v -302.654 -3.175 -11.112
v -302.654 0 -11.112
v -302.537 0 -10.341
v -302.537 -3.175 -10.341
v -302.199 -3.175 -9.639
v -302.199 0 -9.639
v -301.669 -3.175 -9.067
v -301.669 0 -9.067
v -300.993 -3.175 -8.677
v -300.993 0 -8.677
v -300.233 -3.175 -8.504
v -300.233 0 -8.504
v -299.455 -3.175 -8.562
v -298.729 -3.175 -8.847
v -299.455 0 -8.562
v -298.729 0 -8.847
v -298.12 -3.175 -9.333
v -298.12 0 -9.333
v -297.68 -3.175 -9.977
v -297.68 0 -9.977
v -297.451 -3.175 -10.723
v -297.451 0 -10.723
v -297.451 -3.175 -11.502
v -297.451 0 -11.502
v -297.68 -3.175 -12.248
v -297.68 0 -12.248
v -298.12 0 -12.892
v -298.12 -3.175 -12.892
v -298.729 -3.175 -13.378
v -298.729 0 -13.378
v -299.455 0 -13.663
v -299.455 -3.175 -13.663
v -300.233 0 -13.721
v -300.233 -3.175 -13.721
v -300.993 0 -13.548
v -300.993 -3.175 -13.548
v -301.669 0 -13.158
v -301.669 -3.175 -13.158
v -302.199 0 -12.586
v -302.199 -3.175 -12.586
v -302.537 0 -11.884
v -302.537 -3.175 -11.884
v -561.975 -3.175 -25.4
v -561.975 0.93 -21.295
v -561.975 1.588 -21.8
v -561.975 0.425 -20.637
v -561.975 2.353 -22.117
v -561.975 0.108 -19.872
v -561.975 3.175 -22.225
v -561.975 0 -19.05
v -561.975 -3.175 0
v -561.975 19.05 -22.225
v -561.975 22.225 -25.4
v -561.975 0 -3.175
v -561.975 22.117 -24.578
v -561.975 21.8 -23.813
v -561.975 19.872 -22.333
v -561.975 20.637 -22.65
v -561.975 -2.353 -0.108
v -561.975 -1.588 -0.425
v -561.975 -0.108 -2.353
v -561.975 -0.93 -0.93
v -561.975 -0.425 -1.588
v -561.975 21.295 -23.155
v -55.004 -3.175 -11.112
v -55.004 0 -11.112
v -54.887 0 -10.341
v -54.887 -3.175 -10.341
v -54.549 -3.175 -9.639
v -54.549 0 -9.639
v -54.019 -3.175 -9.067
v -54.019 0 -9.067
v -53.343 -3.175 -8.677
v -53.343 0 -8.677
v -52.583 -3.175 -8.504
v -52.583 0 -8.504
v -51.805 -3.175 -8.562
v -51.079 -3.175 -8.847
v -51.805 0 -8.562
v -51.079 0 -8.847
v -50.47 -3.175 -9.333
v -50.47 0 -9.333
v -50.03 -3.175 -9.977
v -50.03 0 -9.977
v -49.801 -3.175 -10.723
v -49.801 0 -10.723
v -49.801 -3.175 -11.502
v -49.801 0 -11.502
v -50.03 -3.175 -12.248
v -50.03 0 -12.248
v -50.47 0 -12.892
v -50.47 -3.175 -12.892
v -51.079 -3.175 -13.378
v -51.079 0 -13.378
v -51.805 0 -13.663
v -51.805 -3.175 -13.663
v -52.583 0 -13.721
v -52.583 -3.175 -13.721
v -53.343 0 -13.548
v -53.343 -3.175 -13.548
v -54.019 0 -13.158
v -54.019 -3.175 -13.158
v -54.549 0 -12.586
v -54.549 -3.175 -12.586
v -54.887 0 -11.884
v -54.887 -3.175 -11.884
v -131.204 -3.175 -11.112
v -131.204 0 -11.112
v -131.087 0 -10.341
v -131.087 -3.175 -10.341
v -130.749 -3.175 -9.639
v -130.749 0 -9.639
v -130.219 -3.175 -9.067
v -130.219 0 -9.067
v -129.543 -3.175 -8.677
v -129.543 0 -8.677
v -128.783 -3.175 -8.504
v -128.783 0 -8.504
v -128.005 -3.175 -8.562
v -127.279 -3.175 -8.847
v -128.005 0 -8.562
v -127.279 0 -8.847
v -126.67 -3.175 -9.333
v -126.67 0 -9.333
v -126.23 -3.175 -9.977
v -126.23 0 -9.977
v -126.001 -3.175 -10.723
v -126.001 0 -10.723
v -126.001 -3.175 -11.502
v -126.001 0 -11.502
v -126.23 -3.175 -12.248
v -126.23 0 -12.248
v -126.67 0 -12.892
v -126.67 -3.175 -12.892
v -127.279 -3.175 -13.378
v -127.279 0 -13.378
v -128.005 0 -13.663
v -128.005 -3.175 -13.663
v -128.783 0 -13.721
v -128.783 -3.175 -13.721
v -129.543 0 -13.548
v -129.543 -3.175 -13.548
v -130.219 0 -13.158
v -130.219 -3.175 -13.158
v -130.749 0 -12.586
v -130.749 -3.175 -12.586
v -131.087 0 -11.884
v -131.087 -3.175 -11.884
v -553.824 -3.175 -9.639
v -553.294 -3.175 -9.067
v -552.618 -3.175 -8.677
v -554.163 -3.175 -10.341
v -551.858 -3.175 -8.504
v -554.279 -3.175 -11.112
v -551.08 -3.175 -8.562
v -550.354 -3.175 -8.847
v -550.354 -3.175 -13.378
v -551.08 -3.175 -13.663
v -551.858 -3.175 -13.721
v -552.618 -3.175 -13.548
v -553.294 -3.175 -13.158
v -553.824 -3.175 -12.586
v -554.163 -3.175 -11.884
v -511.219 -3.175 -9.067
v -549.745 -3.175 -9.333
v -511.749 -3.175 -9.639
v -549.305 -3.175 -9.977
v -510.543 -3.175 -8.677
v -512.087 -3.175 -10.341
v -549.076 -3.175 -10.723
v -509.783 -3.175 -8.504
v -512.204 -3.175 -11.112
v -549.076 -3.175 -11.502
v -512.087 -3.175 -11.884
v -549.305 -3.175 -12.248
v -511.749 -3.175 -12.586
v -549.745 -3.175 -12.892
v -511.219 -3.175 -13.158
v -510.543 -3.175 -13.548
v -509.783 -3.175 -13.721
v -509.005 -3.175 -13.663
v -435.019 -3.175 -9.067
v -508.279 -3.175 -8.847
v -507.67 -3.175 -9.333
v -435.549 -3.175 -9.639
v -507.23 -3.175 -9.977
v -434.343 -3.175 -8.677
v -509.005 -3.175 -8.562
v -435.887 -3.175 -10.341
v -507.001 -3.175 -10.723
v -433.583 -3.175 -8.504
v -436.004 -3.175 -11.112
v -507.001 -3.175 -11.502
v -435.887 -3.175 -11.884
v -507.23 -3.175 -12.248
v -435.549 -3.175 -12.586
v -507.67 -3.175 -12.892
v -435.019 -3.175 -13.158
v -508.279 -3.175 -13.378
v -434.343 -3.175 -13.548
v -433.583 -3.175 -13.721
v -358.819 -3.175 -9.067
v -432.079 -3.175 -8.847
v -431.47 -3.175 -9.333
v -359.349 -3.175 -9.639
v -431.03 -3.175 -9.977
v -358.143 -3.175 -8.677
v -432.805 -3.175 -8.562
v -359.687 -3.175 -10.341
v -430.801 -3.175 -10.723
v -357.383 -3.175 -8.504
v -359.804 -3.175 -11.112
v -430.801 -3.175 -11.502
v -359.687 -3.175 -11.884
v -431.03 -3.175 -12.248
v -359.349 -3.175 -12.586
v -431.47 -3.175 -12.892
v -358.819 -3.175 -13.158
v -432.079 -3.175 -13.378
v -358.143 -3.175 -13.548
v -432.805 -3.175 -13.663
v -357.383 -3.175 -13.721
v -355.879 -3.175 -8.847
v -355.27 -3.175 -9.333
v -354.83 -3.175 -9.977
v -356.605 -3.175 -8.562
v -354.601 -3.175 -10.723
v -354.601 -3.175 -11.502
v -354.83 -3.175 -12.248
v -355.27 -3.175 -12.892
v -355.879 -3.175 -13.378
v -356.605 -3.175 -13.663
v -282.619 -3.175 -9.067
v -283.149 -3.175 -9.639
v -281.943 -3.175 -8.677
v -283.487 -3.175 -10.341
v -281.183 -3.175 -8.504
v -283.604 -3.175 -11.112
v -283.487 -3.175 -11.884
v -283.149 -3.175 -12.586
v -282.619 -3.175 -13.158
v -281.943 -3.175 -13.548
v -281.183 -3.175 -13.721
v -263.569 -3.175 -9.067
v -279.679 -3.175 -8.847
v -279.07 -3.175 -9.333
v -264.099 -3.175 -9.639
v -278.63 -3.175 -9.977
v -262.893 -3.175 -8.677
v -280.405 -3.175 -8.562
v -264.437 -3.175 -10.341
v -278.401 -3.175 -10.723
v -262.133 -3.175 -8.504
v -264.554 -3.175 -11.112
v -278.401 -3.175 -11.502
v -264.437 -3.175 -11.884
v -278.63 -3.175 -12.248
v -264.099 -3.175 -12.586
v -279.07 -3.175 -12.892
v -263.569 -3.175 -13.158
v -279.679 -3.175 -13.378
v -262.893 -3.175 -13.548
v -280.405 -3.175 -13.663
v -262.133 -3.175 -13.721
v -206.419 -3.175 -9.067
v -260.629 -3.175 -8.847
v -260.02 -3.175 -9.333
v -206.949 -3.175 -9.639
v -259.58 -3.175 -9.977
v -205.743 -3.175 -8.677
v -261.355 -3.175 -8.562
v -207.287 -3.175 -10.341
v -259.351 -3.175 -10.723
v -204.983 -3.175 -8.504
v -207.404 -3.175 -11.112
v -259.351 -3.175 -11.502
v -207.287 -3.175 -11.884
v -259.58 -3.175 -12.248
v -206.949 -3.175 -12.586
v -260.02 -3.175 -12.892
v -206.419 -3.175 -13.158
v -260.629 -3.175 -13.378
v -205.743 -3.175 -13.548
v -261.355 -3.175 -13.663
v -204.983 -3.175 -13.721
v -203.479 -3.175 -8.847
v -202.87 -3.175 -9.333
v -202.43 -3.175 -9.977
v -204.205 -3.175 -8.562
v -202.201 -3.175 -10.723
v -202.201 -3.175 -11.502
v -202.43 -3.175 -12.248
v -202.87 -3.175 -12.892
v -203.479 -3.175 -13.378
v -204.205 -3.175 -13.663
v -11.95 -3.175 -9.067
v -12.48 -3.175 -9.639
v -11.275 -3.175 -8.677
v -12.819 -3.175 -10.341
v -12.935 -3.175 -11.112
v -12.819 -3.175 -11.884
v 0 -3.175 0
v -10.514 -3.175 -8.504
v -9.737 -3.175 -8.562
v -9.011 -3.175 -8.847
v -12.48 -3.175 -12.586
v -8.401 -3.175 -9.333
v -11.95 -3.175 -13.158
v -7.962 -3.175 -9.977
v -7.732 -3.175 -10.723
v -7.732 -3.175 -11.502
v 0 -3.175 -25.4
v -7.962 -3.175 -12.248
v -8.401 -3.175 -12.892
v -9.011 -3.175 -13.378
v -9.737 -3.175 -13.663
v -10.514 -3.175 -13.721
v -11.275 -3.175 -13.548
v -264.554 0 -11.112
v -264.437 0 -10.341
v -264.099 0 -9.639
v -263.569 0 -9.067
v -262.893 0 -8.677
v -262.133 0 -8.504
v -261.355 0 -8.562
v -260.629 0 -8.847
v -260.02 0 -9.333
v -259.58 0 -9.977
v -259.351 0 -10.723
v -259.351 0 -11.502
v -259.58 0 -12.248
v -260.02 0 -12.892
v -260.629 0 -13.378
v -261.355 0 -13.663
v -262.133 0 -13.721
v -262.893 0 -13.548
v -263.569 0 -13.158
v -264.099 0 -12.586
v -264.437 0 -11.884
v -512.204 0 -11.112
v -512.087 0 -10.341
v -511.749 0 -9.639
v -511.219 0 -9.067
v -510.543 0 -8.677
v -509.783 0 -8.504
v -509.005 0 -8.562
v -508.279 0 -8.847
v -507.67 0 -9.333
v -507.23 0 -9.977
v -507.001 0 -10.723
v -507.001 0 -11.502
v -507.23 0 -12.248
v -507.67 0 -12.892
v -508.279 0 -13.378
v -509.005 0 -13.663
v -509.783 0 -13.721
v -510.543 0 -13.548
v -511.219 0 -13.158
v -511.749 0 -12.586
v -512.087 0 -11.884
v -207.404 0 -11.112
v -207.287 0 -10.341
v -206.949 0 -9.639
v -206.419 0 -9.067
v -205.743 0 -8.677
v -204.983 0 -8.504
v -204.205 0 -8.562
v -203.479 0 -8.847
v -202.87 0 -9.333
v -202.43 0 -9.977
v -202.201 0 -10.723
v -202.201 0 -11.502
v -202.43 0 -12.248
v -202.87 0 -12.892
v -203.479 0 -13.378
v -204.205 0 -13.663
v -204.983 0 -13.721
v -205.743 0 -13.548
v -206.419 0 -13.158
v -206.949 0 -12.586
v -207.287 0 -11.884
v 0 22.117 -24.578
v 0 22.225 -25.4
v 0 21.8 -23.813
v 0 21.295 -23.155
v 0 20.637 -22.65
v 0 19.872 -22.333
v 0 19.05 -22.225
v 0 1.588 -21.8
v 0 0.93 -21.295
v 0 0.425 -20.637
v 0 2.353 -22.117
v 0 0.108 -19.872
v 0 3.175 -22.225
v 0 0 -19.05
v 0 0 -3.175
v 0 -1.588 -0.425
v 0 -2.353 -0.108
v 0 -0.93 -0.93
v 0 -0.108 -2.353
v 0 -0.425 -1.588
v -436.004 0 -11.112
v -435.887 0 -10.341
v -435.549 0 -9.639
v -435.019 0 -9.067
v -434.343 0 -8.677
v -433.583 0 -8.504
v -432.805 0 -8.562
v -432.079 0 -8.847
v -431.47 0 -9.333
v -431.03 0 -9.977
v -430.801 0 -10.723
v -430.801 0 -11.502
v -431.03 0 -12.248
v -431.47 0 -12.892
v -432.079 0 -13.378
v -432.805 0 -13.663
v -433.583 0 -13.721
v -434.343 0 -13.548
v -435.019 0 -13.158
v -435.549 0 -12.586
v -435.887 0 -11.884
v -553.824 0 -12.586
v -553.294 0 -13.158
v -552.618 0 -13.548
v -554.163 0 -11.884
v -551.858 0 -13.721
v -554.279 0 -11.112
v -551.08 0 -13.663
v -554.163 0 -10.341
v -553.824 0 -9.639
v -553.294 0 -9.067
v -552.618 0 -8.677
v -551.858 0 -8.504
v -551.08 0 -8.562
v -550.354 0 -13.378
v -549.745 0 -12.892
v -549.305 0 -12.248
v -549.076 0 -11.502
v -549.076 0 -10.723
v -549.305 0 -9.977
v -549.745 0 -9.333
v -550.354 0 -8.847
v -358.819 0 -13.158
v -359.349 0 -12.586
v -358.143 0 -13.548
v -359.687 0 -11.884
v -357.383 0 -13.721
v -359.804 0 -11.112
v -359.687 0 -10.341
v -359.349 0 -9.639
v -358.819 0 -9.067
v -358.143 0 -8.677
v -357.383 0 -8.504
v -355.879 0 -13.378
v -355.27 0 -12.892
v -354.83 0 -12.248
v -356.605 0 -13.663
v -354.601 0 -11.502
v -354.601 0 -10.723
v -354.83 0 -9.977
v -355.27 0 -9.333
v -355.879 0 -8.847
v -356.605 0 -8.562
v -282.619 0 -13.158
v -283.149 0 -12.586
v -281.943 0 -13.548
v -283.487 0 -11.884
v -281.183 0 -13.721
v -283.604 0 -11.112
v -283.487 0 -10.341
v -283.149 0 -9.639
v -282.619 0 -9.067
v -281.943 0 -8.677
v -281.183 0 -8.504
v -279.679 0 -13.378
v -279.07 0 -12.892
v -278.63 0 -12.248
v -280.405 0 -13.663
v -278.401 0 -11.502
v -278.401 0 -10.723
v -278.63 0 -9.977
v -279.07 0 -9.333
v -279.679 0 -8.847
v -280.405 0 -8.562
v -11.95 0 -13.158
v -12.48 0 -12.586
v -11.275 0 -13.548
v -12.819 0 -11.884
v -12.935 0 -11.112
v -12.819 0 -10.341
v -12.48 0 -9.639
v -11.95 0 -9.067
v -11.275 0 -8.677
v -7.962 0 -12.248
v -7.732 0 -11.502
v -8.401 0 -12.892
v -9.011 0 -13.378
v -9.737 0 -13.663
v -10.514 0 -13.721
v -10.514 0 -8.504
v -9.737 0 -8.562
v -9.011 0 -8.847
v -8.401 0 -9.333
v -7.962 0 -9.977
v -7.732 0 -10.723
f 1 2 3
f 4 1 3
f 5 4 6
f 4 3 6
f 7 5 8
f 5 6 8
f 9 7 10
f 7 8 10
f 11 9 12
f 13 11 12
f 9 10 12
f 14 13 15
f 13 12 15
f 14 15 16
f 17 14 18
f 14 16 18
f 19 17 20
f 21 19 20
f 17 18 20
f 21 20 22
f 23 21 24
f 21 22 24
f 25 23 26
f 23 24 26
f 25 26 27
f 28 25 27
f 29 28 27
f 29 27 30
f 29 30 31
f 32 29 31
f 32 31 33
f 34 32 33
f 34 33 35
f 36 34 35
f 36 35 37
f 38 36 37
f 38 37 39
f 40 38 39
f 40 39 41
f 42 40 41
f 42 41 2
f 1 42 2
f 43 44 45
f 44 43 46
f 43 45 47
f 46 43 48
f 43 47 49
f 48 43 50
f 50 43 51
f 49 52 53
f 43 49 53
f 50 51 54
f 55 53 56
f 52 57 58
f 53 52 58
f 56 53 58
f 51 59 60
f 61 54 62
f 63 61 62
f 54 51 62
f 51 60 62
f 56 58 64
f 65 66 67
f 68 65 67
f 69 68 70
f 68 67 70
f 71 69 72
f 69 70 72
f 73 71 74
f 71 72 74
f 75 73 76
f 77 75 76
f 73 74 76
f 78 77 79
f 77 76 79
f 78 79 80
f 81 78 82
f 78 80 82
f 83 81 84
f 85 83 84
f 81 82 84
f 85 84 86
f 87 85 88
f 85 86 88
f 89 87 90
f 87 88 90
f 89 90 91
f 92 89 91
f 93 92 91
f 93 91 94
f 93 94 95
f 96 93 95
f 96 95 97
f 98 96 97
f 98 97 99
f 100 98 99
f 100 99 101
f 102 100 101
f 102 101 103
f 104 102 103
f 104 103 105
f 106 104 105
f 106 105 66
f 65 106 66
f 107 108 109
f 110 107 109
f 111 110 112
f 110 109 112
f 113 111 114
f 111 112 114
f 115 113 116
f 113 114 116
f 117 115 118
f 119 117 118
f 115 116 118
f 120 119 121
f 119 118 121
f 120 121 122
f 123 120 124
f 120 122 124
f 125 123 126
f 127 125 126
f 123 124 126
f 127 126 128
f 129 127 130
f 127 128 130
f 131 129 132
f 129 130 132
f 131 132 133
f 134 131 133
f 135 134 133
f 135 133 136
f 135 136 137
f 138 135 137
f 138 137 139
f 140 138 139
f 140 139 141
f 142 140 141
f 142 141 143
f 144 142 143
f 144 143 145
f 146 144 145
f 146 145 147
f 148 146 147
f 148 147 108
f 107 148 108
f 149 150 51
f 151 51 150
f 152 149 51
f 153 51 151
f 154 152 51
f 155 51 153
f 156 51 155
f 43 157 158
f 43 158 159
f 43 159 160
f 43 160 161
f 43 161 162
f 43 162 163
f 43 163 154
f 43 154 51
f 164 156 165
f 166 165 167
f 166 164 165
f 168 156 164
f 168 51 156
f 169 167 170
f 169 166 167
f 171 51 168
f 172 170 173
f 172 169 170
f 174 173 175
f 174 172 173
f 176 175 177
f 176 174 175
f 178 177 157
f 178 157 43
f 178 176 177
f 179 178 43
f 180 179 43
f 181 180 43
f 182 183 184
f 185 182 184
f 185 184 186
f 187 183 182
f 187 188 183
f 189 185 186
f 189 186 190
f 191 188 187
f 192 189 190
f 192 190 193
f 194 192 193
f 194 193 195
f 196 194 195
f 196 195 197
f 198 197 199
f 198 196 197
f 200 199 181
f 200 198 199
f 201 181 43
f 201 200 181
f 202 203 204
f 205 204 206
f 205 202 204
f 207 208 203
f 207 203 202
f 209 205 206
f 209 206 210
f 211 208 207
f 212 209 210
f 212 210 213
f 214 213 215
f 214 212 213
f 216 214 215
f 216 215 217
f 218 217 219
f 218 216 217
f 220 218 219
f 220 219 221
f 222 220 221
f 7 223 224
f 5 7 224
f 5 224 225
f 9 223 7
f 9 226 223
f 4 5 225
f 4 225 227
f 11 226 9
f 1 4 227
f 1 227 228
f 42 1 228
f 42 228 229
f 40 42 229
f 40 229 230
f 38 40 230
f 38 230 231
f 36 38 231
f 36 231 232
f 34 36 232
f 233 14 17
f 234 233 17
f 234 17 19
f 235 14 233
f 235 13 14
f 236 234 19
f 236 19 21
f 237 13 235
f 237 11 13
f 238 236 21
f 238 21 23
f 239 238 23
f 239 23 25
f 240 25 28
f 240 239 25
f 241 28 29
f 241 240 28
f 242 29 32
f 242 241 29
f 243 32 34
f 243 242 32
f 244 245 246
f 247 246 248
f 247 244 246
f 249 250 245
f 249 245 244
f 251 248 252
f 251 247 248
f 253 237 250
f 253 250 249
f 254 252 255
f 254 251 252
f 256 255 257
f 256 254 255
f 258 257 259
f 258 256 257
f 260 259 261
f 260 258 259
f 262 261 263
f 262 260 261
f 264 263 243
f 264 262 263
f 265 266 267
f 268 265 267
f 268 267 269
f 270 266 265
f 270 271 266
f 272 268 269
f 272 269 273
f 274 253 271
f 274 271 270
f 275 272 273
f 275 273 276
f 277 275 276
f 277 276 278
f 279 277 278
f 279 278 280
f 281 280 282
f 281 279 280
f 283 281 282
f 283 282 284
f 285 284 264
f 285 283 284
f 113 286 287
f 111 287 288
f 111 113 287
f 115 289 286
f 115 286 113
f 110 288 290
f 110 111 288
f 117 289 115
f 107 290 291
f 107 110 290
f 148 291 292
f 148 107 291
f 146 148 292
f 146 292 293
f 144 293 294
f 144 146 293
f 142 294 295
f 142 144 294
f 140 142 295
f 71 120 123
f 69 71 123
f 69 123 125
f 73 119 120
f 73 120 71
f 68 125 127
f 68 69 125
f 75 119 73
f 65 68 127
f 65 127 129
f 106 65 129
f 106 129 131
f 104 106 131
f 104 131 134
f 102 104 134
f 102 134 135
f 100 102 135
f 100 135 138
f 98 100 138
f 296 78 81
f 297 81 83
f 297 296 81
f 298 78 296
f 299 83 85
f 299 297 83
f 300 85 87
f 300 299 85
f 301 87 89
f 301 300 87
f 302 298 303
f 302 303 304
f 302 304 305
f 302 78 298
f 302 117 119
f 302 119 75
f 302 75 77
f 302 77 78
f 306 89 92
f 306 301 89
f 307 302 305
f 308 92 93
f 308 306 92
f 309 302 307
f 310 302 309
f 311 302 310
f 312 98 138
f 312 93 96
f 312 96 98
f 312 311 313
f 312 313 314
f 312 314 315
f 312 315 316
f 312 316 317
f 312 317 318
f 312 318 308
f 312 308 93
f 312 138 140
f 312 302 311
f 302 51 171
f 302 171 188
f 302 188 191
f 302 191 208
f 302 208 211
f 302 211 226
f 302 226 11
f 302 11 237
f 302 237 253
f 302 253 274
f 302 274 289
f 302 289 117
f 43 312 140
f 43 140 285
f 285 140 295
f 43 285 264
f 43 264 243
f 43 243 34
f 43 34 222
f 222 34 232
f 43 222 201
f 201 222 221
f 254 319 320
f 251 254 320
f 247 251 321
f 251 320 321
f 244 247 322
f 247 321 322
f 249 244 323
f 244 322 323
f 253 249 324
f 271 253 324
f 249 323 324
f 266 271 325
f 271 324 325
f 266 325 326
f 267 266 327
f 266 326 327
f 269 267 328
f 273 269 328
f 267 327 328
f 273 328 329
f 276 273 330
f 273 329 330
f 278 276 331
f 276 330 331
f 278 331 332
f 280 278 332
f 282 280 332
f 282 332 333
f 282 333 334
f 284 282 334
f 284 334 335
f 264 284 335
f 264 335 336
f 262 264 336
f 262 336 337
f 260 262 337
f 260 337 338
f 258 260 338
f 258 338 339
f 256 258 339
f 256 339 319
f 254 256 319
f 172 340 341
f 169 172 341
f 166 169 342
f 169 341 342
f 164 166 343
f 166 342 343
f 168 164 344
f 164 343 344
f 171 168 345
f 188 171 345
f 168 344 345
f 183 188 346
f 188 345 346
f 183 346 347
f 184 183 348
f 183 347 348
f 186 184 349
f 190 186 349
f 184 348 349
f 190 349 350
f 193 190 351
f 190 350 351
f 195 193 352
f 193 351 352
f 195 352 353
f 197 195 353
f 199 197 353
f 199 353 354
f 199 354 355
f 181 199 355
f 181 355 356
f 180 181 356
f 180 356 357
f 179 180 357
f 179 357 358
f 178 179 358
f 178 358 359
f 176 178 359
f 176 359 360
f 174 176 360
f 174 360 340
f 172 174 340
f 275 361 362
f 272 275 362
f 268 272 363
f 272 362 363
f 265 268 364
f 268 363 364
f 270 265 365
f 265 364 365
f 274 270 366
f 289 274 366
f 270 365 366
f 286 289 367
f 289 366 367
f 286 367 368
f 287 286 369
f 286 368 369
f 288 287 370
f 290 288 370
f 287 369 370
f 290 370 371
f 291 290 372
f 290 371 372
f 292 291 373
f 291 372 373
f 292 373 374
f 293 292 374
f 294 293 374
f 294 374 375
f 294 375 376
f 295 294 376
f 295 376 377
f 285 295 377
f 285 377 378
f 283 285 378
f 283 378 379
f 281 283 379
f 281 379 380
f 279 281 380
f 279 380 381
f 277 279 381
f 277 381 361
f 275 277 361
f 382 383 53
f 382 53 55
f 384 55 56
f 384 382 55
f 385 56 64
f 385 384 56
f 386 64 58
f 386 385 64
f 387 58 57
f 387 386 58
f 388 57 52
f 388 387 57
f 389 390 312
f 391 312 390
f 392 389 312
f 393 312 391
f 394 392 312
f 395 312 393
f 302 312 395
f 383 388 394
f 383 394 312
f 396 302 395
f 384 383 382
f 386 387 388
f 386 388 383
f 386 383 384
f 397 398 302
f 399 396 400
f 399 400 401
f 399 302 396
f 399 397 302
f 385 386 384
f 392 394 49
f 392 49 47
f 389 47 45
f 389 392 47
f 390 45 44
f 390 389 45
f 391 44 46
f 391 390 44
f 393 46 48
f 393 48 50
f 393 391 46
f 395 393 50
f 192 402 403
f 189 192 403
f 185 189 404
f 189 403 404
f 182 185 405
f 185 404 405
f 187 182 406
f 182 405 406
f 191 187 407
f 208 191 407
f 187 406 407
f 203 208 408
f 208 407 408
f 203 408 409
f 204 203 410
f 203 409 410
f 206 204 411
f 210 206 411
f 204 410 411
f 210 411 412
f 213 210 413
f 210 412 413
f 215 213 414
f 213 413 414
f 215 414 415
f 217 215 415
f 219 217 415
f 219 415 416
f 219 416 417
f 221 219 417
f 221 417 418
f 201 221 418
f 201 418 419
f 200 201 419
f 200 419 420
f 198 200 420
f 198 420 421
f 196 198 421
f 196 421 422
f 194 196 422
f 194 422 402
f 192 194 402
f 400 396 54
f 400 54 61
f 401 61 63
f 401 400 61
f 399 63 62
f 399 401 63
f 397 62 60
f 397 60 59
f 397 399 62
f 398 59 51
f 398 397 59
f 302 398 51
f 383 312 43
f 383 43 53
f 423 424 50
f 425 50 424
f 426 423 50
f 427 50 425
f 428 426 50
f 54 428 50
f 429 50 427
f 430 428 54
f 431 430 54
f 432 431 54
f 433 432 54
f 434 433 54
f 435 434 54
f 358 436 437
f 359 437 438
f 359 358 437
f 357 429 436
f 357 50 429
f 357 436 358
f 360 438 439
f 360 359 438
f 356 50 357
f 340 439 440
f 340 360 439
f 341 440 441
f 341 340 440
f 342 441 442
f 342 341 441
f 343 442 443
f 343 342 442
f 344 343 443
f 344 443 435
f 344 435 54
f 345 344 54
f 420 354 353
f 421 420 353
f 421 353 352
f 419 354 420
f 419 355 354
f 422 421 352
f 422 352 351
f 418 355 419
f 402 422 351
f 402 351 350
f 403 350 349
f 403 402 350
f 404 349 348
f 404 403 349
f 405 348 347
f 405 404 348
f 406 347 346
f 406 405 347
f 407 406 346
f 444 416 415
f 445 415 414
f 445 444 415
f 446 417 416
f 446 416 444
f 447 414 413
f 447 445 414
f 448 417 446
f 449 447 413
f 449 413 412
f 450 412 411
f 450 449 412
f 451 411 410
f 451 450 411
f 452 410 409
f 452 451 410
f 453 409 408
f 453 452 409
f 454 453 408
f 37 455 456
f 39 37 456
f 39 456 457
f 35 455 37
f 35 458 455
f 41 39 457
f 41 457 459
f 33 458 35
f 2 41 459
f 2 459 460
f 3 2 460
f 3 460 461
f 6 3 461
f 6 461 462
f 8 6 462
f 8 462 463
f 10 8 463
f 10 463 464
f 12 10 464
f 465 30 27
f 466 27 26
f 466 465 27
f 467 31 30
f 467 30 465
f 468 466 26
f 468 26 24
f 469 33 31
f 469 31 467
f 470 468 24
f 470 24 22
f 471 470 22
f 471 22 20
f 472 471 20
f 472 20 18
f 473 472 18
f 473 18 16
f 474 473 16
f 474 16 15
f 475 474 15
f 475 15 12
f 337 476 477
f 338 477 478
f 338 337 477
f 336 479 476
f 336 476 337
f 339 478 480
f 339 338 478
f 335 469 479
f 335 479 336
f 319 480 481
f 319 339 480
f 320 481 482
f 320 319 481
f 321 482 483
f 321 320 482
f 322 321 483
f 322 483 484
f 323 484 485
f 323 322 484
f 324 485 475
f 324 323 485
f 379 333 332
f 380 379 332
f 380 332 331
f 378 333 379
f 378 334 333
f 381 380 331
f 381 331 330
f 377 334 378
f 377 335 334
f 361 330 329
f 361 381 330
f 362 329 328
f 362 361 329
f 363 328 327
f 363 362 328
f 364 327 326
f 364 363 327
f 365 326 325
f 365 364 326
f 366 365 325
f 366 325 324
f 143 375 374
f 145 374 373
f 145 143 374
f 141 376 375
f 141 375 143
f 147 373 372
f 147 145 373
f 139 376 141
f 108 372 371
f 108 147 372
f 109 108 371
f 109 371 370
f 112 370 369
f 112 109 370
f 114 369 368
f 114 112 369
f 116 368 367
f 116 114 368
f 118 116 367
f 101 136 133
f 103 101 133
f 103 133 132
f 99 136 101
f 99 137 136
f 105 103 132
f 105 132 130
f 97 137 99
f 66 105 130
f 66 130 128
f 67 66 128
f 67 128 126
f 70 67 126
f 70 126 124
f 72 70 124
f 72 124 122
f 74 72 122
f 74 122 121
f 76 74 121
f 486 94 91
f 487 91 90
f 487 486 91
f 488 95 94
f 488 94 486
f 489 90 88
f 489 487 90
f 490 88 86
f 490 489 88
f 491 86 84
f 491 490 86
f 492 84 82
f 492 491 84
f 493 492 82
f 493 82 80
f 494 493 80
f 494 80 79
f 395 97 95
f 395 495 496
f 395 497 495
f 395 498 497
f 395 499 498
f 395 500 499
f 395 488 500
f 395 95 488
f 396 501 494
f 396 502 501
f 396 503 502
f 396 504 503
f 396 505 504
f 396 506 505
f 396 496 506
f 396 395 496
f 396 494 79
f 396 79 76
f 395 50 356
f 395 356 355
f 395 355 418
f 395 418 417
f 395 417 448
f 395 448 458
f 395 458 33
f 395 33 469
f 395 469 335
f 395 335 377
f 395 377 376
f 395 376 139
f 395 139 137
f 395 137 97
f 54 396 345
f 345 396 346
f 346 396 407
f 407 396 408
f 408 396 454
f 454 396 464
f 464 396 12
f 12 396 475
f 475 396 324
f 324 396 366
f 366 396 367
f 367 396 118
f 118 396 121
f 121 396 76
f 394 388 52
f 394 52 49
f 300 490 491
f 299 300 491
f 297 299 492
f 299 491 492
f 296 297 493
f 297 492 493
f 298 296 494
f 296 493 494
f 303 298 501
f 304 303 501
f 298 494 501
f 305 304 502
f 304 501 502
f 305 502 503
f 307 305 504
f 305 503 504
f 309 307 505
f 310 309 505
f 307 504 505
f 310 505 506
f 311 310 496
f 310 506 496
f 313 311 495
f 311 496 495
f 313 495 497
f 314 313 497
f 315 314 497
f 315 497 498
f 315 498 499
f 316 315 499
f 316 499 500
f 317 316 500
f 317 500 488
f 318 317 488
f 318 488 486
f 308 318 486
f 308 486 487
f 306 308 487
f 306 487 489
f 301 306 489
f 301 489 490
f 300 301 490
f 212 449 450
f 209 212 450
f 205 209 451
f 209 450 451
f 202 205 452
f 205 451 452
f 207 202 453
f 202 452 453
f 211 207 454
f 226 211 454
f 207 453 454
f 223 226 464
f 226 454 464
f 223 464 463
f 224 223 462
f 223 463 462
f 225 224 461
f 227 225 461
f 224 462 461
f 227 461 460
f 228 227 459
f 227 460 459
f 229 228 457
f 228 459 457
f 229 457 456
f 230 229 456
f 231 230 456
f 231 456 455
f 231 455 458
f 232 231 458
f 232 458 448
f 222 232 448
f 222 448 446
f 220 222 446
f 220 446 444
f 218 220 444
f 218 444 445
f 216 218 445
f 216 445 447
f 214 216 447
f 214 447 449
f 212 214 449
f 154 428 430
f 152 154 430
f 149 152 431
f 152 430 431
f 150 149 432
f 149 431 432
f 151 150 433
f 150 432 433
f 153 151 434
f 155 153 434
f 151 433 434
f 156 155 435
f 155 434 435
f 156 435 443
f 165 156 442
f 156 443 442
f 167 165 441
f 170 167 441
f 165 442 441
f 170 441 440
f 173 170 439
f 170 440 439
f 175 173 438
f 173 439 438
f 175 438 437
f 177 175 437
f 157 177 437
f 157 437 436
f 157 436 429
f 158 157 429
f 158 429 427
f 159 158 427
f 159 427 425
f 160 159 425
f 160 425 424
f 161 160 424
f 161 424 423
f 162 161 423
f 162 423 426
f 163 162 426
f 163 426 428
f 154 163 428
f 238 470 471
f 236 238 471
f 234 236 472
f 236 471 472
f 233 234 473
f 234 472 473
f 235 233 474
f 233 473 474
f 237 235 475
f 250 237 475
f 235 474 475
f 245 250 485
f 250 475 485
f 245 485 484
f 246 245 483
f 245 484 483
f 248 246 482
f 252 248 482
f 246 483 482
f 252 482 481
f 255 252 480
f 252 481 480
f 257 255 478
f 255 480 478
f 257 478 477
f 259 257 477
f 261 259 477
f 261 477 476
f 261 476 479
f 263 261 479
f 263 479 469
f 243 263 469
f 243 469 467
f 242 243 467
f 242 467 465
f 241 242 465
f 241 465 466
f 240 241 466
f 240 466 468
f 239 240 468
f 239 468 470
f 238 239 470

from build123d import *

# Parameters (mm, degrees)
F1_DEPTH = 561.975
F2_R     = 2.6162
F3_DEPTH = 25.4


with BuildPart() as f1:
    # F0 (on Right) → F1 (new body)
    with BuildSketch(Plane.YZ):
        with BuildLine():
            Line((0, -19.05), (0, -3.175))
            ThreePointArc((0, -3.175), (-0.929936, -0.929936), (-3.175, 0))
            Line((-3.175, 0), (-3.175, -25.4))
            Line((-3.175, -25.4), (22.225, -25.4))
            ThreePointArc((22.225, -25.4), (21.295064, -23.154936), (19.05, -22.225))
            Line((19.05, -22.225), (3.175, -22.225))
            ThreePointArc((3.175, -22.225), (0.929936, -21.295064), (0, -19.05))
        make_face()
    extrude(amount=-F1_DEPTH)

    # F2 (on face) → F3 (cut)
    with BuildSketch(Plane(origin=(0, 0, 0), x_dir=(-1, 0, 0), z_dir=(0, 1, 0))):
        with Locations((10.31875, -11.1125)):
            Circle(F2_R)
        with Locations((280.9875, -11.1125)):
            Circle(F2_R)
        with Locations((551.6626, -11.1125)):
            Circle(F2_R)
        with Locations((128.5875, -11.1125)):
            Circle(F2_R)
        with Locations((204.7875, -11.1125)):
            Circle(F2_R)
        with Locations((357.1875, -11.1125)):
            Circle(F2_R)
        with Locations((433.3875, -11.1125)):
            Circle(F2_R)
        with Locations((509.5875, -11.1125)):
            Circle(F2_R)
        with Locations((52.3875, -11.1125)):
            Circle(F2_R)
        with Locations((261.9375, -11.1125)):
            Circle(F2_R)
        with Locations((300.0375, -11.1125)):
            Circle(F2_R)
    extrude(amount=-F3_DEPTH, mode=Mode.SUBTRACT)


solid = f1.part
